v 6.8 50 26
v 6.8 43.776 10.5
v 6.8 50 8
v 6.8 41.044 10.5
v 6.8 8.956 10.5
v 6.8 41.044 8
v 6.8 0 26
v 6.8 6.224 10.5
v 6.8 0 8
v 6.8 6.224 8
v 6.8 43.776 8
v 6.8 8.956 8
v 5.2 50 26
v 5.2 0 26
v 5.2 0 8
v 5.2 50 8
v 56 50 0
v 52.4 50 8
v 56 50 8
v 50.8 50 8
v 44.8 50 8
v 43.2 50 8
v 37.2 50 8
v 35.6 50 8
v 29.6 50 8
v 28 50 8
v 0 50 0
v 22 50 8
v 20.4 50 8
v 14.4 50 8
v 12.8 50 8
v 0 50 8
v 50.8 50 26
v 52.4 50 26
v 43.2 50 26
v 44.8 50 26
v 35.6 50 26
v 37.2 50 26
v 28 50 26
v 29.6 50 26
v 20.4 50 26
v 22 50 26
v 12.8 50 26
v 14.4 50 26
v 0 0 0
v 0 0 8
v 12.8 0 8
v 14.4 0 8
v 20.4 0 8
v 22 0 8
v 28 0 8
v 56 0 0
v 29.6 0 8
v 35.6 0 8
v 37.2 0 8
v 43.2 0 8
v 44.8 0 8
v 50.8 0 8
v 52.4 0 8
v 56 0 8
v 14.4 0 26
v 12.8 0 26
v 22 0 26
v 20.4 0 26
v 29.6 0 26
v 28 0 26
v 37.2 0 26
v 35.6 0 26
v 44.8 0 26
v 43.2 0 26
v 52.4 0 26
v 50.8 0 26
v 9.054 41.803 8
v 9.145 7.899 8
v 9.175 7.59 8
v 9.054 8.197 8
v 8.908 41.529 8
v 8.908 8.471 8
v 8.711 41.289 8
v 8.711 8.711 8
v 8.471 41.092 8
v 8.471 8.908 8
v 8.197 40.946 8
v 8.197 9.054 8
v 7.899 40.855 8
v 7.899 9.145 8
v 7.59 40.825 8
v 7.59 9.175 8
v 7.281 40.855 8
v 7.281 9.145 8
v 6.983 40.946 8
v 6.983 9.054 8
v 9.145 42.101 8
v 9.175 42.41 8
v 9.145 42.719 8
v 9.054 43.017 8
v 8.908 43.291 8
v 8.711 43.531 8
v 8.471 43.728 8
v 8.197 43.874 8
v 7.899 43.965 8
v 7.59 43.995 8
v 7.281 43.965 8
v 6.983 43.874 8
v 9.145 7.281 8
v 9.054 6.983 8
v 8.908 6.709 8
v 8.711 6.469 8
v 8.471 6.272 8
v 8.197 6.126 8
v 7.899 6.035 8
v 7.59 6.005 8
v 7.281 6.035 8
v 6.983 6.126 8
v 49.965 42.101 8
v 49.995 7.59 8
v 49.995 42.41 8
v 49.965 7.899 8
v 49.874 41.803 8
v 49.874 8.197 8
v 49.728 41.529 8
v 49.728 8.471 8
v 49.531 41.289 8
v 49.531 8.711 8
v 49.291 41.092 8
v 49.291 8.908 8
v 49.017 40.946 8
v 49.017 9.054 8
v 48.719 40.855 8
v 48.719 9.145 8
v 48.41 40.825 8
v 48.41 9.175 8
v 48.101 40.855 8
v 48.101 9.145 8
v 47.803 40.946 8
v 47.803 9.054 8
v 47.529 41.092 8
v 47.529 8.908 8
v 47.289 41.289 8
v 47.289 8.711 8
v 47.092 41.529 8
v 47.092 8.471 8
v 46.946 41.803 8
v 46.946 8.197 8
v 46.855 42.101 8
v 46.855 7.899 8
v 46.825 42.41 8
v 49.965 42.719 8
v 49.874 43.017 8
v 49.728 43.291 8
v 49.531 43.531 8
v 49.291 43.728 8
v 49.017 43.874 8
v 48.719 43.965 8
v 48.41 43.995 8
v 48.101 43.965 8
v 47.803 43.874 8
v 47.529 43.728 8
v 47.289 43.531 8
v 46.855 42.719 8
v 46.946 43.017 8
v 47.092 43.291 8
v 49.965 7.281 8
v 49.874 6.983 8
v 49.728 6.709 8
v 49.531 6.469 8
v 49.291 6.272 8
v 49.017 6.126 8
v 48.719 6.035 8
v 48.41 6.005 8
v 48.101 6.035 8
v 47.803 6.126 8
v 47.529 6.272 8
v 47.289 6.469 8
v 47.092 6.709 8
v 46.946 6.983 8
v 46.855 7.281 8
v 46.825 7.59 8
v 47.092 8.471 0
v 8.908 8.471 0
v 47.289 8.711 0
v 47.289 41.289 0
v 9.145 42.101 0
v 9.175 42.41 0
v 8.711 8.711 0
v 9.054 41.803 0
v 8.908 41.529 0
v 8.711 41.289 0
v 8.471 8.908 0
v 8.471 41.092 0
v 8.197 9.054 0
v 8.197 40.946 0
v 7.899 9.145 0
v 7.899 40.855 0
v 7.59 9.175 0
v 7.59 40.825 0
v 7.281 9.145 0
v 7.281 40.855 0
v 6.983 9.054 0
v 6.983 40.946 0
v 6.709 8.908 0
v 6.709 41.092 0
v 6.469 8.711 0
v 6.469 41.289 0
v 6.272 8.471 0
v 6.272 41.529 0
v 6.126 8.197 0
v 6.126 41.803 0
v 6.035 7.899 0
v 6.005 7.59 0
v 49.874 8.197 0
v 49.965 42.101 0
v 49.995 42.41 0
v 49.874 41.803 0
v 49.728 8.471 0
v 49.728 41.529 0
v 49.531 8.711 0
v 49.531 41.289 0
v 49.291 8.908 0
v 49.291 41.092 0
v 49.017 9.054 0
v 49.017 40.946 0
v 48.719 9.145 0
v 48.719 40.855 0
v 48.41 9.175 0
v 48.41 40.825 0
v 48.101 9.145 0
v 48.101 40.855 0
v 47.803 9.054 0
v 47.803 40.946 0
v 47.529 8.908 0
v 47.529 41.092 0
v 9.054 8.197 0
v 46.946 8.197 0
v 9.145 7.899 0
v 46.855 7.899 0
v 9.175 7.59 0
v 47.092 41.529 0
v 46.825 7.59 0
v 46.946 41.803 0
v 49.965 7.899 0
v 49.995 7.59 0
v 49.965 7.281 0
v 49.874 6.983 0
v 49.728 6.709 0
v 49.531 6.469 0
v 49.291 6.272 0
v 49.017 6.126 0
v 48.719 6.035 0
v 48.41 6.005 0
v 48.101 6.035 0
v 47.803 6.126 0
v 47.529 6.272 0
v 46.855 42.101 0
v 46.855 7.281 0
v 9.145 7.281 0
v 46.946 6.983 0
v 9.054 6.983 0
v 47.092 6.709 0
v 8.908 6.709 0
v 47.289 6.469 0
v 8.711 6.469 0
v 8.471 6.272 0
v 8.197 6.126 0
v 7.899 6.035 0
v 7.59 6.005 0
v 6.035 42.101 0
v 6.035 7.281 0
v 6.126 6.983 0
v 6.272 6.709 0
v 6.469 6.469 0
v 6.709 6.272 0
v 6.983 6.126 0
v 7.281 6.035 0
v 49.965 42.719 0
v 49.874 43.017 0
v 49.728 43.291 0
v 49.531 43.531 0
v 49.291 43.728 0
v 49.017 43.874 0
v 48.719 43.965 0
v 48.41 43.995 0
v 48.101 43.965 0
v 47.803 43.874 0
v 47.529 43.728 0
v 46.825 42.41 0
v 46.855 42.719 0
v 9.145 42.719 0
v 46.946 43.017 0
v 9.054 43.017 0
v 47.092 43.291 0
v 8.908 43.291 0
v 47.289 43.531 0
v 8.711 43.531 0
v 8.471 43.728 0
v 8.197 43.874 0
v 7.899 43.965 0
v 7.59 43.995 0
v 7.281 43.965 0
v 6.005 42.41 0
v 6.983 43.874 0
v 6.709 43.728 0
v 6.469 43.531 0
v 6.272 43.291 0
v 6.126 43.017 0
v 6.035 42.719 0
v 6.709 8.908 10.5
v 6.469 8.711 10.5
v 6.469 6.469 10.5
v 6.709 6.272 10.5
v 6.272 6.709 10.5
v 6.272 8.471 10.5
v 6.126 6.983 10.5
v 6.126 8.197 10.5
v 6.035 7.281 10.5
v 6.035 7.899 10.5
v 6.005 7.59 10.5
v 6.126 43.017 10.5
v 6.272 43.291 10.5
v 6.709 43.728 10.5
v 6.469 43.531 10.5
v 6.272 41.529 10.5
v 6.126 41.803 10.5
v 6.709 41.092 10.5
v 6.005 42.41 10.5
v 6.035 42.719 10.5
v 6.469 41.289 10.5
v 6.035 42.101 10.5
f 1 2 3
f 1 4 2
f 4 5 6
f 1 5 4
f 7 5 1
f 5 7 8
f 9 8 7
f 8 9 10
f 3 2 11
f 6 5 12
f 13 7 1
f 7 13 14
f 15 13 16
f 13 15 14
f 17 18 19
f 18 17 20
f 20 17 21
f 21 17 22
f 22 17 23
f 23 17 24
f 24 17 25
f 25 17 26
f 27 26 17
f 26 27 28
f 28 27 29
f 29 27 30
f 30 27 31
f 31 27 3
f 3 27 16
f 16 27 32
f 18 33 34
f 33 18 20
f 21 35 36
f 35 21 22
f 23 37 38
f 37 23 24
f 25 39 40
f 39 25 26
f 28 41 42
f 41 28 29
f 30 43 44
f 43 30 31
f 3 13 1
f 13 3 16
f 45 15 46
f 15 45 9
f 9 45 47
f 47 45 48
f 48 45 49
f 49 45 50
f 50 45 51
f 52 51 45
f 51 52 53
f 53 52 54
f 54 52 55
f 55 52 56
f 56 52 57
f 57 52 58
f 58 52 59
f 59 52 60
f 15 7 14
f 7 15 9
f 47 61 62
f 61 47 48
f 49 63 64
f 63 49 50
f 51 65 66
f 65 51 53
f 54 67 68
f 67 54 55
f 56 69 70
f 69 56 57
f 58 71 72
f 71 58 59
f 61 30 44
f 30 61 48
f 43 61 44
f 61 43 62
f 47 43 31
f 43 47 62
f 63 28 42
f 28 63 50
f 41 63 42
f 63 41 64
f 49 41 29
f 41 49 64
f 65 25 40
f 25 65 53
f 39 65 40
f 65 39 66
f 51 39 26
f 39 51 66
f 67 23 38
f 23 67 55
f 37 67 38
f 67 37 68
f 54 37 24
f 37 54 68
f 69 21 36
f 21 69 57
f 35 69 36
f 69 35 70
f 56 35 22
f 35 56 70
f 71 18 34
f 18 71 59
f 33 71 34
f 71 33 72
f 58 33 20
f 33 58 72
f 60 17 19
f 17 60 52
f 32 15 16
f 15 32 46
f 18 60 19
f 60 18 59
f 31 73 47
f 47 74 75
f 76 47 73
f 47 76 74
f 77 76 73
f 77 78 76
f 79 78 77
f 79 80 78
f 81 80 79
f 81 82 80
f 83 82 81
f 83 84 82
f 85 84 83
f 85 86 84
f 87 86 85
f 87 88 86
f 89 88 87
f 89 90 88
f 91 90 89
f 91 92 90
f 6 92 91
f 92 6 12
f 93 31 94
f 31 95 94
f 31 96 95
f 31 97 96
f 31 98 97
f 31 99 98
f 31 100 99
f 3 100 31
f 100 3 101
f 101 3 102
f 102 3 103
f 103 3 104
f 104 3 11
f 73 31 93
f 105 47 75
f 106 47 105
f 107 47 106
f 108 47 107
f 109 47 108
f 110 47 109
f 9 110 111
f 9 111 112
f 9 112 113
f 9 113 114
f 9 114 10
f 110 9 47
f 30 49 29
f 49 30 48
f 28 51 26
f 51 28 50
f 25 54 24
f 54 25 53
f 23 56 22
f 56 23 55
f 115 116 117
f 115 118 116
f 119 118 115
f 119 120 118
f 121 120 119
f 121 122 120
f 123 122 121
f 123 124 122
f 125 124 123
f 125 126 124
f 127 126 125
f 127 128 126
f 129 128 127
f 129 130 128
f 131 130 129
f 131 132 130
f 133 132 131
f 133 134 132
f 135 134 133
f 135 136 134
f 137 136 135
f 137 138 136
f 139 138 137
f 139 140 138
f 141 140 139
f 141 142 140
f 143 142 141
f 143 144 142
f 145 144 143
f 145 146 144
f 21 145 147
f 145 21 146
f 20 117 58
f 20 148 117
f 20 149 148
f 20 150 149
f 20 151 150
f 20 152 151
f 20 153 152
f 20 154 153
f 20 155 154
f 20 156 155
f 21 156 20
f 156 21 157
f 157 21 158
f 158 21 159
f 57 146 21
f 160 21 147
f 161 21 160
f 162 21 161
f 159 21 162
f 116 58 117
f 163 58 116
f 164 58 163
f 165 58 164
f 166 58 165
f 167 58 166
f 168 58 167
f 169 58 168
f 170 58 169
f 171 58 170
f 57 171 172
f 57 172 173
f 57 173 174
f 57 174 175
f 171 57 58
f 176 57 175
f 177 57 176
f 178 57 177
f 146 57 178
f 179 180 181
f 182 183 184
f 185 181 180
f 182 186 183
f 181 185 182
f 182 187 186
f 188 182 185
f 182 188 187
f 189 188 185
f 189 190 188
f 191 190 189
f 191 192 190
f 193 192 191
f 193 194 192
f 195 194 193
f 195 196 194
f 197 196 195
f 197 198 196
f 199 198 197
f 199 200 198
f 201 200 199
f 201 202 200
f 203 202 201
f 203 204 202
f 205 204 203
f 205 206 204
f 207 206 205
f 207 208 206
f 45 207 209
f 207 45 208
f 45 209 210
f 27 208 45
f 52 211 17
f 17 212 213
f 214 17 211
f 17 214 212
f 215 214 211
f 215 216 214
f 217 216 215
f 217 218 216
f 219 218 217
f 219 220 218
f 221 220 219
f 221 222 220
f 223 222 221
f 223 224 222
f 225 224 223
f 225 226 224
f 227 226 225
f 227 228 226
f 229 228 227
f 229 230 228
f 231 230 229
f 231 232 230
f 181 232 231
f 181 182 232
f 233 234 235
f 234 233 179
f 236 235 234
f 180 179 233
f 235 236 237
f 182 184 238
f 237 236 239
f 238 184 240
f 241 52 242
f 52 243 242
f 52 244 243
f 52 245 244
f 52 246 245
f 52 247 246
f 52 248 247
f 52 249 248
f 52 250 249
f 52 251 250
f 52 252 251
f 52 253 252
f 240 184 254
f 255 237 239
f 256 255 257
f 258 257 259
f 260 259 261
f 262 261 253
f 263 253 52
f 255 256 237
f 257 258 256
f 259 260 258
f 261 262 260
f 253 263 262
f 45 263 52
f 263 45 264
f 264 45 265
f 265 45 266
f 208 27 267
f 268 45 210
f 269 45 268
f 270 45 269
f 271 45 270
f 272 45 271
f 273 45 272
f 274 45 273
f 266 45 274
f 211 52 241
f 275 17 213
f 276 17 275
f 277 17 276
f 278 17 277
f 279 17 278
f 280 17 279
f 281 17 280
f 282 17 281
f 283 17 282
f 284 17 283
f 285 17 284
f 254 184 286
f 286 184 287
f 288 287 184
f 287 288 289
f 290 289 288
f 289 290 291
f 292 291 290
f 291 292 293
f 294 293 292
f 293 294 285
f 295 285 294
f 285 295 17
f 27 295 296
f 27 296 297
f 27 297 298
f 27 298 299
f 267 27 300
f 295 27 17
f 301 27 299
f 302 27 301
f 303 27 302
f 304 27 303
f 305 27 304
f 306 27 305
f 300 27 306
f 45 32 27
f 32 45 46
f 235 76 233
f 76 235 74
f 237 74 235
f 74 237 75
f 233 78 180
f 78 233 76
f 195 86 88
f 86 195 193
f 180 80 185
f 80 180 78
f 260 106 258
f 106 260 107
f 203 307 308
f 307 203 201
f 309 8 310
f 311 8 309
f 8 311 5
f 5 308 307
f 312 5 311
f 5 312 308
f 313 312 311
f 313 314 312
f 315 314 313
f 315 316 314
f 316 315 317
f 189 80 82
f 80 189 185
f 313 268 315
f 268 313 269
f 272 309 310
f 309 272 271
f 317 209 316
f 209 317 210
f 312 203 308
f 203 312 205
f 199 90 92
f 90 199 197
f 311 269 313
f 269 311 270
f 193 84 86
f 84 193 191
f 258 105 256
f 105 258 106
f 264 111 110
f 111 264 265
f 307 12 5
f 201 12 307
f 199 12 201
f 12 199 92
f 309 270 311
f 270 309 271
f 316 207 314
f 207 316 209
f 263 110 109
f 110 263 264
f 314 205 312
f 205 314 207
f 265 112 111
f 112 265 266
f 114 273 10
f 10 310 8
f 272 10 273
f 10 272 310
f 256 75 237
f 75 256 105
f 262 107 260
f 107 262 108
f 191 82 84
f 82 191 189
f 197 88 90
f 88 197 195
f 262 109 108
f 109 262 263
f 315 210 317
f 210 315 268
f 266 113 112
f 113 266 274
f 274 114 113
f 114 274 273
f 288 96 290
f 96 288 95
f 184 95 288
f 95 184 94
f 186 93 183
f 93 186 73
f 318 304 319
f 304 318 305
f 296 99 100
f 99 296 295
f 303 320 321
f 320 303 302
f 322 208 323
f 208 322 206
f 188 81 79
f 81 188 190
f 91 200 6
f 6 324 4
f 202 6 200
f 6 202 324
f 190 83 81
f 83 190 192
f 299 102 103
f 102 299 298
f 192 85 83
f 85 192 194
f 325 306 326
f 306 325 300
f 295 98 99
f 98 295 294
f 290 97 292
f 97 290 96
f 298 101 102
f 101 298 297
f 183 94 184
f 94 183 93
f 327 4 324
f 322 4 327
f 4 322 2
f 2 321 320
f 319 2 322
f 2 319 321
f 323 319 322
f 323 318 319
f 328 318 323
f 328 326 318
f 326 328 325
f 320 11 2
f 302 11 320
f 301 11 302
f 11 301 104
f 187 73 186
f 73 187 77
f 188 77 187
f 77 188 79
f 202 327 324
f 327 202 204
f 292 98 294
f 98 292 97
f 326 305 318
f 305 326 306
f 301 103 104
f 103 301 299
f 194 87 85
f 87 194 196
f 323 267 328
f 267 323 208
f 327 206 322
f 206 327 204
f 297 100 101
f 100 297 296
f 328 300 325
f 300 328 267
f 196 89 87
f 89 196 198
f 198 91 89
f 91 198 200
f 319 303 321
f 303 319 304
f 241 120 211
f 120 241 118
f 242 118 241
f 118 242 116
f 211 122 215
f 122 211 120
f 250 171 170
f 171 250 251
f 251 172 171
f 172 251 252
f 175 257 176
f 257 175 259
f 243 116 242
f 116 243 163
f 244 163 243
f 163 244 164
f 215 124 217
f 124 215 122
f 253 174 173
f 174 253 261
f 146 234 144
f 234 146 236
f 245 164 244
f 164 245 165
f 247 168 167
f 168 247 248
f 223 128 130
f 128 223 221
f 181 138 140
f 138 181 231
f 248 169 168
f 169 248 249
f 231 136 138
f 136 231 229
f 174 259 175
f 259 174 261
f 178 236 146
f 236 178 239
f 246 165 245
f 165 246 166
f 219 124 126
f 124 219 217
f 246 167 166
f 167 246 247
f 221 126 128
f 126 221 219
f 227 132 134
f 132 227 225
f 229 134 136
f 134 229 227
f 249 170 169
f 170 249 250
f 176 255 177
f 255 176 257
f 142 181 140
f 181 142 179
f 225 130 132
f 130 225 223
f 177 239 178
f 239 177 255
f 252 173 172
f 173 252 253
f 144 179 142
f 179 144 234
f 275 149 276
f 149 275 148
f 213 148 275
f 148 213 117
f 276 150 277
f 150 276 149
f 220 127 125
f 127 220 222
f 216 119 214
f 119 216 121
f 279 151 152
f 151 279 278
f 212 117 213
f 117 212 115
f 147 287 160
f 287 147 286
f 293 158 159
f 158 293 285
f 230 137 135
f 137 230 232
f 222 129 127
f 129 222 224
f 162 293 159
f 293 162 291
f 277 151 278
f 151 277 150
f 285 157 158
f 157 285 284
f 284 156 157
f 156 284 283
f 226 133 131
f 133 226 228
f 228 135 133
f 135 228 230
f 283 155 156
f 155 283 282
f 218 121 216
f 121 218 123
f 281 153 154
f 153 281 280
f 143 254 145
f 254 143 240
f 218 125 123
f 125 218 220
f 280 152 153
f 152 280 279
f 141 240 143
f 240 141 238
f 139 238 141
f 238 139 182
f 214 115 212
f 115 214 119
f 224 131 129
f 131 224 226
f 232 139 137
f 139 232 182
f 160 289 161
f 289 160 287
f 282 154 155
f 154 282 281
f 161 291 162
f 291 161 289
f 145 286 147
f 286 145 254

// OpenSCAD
$fn = 32;

// ----------------------------------------------------------------------
// Finned heat sink: 56 x 50 mm base, 18 mm fins
// ----------------------------------------------------------------------

// --- parameters (mm) ---
base_w = 56;              // base width
base_d = 50;              // base depth
base_t = 8;               // base thickness
fin_h = 18;               // fin height above the base
holes_d = 3.17;           // fixing holes
hole_x = 20.41;           // hole offset in x
hole_y = 17.41;           // hole offset in y
fin_t = 1.6;              // fin thickness
fin_pitch = 7.6;          // fin pitch
fin_count = 7;            // number of fins
fin_x0 = 5.2;             // first fin offset

difference() {
  union() {
    cube([base_w, base_d, base_t]);
    for (i = [0 : fin_count - 1]) {
      translate([fin_x0 + i * fin_pitch, 0, base_t - 0.5]) cube([fin_t, base_d, fin_h + 0.5]);
    }
  }
  /* fixing holes through the base, 2.5 mm clear on both sides */
  for (hx = [-20.41, 20.41]) {
    for (hy = [-17.41, 17.41]) {
      translate([base_w / 2 + hx, base_d / 2 + hy, -2.5]) cylinder(h = base_t + 5, d = holes_d);
    }
  }
}
